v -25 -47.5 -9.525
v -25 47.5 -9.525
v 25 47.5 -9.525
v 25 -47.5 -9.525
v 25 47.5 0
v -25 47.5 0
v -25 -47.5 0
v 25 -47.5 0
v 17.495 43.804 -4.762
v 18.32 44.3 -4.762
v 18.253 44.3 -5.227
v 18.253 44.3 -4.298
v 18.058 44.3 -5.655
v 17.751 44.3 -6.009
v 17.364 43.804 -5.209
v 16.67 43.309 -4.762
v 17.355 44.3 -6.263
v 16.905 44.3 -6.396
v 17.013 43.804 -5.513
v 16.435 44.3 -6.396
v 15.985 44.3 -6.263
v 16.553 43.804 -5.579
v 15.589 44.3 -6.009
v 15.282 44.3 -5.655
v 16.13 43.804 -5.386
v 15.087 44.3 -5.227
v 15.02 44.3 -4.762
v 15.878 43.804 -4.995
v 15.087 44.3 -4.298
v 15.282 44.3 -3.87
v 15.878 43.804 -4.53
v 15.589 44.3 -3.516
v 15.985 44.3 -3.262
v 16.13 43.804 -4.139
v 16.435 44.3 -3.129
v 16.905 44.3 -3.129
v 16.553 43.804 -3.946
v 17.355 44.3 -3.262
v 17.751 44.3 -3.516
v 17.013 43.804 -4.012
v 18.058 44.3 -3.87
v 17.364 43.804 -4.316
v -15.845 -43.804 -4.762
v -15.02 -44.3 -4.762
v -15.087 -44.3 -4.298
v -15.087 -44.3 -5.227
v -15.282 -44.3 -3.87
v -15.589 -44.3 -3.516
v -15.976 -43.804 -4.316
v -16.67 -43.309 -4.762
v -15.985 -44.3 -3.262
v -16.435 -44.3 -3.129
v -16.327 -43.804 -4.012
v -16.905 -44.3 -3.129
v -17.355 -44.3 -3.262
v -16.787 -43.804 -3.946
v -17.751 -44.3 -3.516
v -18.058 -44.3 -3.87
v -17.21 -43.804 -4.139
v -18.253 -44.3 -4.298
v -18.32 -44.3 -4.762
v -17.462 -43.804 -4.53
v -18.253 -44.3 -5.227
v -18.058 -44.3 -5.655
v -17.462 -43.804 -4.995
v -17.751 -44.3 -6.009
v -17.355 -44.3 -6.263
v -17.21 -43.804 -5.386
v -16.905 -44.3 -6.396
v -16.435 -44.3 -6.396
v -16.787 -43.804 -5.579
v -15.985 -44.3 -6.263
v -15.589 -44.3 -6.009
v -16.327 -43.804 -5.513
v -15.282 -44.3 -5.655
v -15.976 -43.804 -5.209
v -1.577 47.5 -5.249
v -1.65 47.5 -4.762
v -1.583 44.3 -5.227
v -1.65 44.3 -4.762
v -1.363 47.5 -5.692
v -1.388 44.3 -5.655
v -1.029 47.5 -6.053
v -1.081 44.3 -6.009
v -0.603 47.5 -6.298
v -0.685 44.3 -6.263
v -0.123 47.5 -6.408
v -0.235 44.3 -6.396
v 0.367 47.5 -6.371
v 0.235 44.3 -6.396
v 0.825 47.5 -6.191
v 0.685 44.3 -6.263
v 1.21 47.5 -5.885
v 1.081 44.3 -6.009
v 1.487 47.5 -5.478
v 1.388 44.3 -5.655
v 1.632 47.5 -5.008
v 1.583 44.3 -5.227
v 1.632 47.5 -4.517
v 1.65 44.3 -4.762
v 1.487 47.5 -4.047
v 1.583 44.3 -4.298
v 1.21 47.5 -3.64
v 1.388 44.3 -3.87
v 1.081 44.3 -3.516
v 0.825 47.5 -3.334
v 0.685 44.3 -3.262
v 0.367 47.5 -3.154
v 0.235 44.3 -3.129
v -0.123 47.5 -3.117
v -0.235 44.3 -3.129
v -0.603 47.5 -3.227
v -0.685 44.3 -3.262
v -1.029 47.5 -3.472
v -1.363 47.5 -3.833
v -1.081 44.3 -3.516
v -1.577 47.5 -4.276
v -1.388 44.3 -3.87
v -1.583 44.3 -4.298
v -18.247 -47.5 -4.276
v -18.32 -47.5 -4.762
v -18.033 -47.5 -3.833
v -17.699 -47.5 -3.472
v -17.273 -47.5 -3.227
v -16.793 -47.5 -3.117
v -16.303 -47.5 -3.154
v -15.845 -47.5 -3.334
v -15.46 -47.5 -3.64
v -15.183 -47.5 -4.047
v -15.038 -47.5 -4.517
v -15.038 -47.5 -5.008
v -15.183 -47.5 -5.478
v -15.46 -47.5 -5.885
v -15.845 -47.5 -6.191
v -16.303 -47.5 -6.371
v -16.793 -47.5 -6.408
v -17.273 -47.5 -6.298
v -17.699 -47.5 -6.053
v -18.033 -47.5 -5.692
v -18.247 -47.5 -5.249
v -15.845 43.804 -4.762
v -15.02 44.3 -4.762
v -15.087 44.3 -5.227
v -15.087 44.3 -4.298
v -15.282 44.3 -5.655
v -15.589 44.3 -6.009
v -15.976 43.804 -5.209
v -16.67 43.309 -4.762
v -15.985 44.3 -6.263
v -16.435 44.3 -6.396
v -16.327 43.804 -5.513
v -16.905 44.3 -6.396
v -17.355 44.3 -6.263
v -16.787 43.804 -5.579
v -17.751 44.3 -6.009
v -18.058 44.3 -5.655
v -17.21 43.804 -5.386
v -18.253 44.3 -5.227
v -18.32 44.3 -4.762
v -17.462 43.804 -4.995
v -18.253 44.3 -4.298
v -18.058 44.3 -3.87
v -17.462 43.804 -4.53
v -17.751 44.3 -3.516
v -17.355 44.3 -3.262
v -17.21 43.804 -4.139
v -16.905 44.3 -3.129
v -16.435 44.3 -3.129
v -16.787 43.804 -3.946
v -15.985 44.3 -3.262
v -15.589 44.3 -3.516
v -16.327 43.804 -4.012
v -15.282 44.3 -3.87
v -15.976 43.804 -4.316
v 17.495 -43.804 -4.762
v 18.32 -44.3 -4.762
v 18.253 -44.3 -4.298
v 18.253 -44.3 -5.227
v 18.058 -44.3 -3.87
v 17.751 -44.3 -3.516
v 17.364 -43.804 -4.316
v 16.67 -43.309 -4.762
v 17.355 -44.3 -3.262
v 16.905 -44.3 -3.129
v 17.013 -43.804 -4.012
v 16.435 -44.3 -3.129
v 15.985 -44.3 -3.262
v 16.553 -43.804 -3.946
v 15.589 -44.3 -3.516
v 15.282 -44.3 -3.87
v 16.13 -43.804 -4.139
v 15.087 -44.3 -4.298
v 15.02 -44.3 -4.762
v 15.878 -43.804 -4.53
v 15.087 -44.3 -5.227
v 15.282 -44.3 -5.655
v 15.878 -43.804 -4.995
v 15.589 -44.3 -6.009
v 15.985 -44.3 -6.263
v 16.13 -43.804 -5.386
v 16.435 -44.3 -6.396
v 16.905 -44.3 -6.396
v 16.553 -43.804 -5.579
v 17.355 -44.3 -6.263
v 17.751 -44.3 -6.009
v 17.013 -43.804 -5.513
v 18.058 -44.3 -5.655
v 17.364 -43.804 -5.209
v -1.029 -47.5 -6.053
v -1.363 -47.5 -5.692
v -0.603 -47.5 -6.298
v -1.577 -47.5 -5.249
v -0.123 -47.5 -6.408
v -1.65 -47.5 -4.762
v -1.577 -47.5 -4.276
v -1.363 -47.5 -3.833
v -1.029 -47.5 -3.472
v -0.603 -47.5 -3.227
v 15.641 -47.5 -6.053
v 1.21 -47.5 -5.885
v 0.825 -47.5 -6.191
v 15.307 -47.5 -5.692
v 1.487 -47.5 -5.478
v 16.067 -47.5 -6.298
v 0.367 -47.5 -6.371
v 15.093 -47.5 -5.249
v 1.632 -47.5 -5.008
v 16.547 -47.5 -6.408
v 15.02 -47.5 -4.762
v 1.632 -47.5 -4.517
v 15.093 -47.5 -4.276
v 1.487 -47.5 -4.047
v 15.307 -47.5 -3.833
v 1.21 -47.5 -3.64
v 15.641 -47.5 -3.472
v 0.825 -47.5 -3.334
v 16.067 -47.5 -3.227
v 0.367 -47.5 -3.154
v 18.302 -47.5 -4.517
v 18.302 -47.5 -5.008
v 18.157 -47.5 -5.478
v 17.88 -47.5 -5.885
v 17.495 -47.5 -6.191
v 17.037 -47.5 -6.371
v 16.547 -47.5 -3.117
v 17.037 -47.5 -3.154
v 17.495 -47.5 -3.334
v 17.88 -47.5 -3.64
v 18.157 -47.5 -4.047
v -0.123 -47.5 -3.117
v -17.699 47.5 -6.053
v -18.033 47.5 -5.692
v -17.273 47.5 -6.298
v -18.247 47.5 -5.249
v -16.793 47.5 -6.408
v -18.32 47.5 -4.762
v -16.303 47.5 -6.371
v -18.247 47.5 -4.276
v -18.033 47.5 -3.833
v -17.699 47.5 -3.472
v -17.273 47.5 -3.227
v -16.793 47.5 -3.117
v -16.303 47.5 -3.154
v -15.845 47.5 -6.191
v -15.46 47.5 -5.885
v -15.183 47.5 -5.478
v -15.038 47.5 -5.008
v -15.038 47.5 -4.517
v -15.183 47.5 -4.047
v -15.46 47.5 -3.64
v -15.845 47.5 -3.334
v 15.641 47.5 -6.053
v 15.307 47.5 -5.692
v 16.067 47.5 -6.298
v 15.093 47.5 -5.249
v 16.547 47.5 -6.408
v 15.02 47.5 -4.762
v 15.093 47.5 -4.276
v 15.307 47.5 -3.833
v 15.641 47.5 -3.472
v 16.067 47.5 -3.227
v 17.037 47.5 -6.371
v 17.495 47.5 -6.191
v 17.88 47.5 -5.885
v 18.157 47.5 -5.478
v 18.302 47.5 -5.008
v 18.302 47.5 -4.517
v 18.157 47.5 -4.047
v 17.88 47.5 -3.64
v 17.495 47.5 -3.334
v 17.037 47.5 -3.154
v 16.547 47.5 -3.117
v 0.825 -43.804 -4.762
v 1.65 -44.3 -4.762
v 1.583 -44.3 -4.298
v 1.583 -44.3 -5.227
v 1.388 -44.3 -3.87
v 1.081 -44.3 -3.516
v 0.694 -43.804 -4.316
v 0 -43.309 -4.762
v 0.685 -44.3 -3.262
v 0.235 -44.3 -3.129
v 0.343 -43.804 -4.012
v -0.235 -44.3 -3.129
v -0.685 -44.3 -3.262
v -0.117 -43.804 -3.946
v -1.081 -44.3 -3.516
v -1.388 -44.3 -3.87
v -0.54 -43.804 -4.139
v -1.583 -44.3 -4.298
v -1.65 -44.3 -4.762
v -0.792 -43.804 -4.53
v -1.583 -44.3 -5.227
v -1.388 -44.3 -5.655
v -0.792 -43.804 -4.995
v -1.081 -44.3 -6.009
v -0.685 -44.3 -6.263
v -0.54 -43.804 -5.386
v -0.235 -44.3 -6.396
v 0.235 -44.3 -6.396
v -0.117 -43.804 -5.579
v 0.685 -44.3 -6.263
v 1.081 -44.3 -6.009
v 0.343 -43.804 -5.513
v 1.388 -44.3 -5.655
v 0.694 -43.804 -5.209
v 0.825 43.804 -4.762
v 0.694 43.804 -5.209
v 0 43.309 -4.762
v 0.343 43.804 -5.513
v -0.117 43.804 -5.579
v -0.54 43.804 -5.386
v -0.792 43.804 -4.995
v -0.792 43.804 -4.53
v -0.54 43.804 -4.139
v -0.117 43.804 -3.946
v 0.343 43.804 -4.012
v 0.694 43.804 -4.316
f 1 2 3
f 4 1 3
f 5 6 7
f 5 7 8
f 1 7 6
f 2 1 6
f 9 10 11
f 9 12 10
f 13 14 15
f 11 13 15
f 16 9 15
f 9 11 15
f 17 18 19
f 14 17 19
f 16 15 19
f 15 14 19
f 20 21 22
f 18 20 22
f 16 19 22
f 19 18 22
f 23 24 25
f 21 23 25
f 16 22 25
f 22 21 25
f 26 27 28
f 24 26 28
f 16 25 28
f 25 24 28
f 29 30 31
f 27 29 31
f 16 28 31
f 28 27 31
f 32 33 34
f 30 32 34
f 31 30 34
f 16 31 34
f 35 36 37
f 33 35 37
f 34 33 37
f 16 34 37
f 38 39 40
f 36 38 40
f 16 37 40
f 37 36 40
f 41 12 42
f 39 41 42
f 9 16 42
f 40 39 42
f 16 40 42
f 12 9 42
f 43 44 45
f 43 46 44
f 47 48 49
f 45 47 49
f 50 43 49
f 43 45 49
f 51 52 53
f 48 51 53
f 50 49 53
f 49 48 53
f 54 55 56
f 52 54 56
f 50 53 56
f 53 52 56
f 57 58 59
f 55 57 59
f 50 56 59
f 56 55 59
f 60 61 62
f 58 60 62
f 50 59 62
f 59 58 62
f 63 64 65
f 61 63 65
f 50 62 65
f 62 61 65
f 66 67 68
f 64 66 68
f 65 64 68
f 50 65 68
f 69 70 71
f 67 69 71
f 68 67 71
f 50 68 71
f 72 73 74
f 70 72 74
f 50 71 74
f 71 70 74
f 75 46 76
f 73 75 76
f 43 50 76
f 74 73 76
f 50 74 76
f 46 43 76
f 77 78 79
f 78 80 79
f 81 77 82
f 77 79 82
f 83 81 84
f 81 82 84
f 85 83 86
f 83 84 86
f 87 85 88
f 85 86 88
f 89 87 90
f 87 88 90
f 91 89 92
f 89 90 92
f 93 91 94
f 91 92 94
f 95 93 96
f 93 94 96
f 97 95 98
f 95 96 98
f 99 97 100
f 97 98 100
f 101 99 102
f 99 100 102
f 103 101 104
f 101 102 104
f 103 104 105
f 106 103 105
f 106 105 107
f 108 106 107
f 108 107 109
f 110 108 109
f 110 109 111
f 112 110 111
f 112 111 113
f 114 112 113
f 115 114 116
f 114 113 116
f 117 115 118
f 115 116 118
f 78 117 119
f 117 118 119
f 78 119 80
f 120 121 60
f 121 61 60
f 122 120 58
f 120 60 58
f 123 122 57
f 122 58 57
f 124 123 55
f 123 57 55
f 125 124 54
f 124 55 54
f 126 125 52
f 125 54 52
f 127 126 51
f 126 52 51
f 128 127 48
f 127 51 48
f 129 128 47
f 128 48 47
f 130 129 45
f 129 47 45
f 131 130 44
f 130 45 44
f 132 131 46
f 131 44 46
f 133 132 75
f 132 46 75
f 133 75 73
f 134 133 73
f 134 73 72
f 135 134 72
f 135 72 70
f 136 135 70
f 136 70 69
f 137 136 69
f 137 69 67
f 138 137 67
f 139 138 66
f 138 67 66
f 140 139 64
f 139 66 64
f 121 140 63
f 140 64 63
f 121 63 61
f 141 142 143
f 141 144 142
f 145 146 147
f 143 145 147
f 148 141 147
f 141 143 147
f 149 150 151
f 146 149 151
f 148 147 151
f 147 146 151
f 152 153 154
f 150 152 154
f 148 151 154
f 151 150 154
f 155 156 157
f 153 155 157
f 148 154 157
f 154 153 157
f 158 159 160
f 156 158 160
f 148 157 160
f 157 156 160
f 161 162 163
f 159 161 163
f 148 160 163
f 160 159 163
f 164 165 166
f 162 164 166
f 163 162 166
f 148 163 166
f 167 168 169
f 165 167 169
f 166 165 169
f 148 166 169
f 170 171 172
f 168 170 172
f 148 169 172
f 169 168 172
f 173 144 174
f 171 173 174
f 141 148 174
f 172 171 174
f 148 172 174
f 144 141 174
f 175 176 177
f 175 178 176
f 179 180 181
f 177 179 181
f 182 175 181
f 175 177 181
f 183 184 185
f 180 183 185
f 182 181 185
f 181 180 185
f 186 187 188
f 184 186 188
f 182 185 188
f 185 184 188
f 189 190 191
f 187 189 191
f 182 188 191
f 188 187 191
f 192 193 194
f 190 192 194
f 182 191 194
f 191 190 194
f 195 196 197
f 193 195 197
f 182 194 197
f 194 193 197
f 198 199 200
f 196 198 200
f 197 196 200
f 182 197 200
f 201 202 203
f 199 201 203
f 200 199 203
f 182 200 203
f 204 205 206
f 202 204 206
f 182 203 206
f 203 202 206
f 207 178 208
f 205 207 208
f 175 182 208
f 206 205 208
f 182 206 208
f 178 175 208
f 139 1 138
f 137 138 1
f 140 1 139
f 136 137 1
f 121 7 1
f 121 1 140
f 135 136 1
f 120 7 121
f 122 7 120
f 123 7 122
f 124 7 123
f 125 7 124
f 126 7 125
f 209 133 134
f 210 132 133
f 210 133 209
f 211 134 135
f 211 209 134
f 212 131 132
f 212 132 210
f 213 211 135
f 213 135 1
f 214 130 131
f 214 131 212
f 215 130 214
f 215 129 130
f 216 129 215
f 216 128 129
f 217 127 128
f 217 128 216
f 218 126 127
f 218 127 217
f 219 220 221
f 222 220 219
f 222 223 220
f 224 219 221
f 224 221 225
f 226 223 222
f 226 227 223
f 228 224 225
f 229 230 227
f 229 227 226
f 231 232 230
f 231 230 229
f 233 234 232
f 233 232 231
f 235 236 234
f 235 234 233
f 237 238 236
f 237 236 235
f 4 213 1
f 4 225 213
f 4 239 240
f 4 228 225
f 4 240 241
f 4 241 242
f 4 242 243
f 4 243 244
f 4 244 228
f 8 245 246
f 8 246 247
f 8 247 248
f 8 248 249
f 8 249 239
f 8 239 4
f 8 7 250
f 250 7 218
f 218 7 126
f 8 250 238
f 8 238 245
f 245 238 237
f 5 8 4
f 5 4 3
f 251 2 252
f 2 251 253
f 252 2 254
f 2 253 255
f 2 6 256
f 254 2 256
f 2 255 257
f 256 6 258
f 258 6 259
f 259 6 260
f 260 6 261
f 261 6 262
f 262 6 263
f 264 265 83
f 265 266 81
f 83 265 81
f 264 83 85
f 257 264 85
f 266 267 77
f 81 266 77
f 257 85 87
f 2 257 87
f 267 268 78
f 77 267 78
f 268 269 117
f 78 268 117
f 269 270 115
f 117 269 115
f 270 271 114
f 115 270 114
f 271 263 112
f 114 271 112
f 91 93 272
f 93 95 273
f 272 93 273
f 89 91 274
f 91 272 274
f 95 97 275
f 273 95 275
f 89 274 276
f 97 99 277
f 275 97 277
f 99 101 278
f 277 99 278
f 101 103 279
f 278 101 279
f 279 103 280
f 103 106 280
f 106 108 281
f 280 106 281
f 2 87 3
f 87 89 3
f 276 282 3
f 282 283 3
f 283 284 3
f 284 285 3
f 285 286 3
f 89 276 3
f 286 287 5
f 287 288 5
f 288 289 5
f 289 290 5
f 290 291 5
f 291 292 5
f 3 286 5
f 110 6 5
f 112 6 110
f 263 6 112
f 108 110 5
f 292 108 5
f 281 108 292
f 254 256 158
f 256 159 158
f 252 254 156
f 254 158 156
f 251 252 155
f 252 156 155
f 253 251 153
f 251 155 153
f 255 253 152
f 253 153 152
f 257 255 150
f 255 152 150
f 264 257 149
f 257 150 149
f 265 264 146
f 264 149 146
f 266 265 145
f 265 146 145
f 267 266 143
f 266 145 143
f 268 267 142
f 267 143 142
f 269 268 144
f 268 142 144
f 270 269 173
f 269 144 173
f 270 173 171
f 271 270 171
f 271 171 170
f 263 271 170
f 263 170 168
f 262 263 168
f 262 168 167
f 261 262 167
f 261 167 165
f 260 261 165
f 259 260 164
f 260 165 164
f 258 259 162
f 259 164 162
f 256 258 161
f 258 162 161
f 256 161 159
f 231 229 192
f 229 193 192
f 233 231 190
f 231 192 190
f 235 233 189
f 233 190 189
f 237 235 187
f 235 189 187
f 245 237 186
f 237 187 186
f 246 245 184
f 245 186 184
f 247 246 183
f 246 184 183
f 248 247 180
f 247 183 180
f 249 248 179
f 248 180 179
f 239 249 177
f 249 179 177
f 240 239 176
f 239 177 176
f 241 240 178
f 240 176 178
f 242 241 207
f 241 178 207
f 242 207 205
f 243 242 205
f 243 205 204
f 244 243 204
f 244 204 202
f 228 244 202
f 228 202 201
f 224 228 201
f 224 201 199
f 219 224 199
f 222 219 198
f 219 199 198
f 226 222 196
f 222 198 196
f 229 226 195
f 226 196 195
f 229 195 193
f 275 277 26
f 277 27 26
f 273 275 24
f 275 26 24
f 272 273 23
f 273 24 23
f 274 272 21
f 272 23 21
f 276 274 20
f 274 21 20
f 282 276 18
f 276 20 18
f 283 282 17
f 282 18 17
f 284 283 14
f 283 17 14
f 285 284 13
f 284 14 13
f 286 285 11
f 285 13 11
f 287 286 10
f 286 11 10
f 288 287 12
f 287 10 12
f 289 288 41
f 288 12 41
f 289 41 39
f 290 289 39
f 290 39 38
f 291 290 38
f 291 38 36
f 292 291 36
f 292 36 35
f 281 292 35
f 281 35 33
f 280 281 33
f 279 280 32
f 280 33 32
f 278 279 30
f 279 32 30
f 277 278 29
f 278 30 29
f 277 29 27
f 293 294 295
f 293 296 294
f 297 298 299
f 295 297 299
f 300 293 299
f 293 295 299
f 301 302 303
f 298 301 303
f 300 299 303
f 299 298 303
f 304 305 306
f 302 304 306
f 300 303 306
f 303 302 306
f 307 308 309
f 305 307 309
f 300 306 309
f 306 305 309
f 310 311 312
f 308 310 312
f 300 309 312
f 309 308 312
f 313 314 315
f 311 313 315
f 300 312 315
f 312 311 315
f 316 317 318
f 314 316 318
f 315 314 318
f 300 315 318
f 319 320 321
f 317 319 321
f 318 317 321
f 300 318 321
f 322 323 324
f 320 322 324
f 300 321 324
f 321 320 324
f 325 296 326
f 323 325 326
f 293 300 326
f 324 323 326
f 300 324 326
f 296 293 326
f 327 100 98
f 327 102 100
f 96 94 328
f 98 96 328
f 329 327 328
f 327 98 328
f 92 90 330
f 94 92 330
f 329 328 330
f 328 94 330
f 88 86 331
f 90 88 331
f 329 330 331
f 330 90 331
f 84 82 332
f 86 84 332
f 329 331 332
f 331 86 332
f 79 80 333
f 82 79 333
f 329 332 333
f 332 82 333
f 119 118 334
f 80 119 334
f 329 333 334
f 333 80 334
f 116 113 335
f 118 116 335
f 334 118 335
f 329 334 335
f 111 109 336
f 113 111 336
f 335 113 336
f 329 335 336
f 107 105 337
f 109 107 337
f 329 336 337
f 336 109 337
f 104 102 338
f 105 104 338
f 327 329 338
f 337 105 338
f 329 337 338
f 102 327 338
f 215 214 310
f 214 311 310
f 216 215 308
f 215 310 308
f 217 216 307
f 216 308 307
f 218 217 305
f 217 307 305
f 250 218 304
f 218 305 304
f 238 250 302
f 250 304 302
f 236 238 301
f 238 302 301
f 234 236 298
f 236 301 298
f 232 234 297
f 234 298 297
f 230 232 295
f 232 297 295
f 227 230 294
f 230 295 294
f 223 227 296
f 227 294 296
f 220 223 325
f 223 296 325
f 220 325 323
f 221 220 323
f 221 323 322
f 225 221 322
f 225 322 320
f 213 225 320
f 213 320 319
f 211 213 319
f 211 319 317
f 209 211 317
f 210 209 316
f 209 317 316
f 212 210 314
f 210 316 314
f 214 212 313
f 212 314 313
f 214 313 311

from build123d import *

# Parameters (mm, degrees)
SKETCH1_W                       = 50
SKETCH1_H                       = 95
BOSS_EXTRUDE1_DEPTH             = 9.525
TAP_DRILL_FOR_M4X0_7_TAP1_D     = 3.3
TAP_DRILL_FOR_M4X0_7_TAP1_DEPTH = 3.2
TAP_DRILL_FOR_M4X0_7_TAP1_TIP   = 0.991420021
TAP_DRILL_FOR_M4X0_7_TAP2_D     = 3.3
TAP_DRILL_FOR_M4X0_7_TAP2_DEPTH = 3.2
TAP_DRILL_FOR_M4X0_7_TAP2_TIP   = 0.991420021


with BuildPart() as part:
    # Sketch1 → Boss-Extrude1 (new body)
    with BuildSketch(Plane.XY):
        Rectangle(SKETCH1_W, SKETCH1_H)
    extrude(amount=-BOSS_EXTRUDE1_DEPTH)

    # Tap Drill for M4x0.7 Tap1
    with Locations(Plane.XZ.offset(47.5)):
        with Locations((16.67, -4.7625), (0, -4.7625), (-16.67, -4.7625)):
            Hole(TAP_DRILL_FOR_M4X0_7_TAP1_D / 2, depth=TAP_DRILL_FOR_M4X0_7_TAP1_DEPTH)
            with Locations((0, 0, -(TAP_DRILL_FOR_M4X0_7_TAP1_DEPTH + TAP_DRILL_FOR_M4X0_7_TAP1_TIP / 2))):  # 118° drill point
                Cone(0, TAP_DRILL_FOR_M4X0_7_TAP1_D / 2, TAP_DRILL_FOR_M4X0_7_TAP1_TIP, mode=Mode.SUBTRACT)

    # Tap Drill for M4x0.7 Tap2
    with Locations(Plane(origin=(0, 47.5, 0), x_dir=(1, 0, 0), z_dir=(0, 1, 0))):
        with Locations((0, 4.7625), (16.67, 4.7625), (-16.67, 4.7625)):
            Hole(TAP_DRILL_FOR_M4X0_7_TAP2_D / 2, depth=TAP_DRILL_FOR_M4X0_7_TAP2_DEPTH)
            with Locations((0, 0, -(TAP_DRILL_FOR_M4X0_7_TAP2_DEPTH + TAP_DRILL_FOR_M4X0_7_TAP2_TIP / 2))):  # 118° drill point
                Cone(0, TAP_DRILL_FOR_M4X0_7_TAP2_D / 2, TAP_DRILL_FOR_M4X0_7_TAP2_TIP, mode=Mode.SUBTRACT)


solid = part.part
